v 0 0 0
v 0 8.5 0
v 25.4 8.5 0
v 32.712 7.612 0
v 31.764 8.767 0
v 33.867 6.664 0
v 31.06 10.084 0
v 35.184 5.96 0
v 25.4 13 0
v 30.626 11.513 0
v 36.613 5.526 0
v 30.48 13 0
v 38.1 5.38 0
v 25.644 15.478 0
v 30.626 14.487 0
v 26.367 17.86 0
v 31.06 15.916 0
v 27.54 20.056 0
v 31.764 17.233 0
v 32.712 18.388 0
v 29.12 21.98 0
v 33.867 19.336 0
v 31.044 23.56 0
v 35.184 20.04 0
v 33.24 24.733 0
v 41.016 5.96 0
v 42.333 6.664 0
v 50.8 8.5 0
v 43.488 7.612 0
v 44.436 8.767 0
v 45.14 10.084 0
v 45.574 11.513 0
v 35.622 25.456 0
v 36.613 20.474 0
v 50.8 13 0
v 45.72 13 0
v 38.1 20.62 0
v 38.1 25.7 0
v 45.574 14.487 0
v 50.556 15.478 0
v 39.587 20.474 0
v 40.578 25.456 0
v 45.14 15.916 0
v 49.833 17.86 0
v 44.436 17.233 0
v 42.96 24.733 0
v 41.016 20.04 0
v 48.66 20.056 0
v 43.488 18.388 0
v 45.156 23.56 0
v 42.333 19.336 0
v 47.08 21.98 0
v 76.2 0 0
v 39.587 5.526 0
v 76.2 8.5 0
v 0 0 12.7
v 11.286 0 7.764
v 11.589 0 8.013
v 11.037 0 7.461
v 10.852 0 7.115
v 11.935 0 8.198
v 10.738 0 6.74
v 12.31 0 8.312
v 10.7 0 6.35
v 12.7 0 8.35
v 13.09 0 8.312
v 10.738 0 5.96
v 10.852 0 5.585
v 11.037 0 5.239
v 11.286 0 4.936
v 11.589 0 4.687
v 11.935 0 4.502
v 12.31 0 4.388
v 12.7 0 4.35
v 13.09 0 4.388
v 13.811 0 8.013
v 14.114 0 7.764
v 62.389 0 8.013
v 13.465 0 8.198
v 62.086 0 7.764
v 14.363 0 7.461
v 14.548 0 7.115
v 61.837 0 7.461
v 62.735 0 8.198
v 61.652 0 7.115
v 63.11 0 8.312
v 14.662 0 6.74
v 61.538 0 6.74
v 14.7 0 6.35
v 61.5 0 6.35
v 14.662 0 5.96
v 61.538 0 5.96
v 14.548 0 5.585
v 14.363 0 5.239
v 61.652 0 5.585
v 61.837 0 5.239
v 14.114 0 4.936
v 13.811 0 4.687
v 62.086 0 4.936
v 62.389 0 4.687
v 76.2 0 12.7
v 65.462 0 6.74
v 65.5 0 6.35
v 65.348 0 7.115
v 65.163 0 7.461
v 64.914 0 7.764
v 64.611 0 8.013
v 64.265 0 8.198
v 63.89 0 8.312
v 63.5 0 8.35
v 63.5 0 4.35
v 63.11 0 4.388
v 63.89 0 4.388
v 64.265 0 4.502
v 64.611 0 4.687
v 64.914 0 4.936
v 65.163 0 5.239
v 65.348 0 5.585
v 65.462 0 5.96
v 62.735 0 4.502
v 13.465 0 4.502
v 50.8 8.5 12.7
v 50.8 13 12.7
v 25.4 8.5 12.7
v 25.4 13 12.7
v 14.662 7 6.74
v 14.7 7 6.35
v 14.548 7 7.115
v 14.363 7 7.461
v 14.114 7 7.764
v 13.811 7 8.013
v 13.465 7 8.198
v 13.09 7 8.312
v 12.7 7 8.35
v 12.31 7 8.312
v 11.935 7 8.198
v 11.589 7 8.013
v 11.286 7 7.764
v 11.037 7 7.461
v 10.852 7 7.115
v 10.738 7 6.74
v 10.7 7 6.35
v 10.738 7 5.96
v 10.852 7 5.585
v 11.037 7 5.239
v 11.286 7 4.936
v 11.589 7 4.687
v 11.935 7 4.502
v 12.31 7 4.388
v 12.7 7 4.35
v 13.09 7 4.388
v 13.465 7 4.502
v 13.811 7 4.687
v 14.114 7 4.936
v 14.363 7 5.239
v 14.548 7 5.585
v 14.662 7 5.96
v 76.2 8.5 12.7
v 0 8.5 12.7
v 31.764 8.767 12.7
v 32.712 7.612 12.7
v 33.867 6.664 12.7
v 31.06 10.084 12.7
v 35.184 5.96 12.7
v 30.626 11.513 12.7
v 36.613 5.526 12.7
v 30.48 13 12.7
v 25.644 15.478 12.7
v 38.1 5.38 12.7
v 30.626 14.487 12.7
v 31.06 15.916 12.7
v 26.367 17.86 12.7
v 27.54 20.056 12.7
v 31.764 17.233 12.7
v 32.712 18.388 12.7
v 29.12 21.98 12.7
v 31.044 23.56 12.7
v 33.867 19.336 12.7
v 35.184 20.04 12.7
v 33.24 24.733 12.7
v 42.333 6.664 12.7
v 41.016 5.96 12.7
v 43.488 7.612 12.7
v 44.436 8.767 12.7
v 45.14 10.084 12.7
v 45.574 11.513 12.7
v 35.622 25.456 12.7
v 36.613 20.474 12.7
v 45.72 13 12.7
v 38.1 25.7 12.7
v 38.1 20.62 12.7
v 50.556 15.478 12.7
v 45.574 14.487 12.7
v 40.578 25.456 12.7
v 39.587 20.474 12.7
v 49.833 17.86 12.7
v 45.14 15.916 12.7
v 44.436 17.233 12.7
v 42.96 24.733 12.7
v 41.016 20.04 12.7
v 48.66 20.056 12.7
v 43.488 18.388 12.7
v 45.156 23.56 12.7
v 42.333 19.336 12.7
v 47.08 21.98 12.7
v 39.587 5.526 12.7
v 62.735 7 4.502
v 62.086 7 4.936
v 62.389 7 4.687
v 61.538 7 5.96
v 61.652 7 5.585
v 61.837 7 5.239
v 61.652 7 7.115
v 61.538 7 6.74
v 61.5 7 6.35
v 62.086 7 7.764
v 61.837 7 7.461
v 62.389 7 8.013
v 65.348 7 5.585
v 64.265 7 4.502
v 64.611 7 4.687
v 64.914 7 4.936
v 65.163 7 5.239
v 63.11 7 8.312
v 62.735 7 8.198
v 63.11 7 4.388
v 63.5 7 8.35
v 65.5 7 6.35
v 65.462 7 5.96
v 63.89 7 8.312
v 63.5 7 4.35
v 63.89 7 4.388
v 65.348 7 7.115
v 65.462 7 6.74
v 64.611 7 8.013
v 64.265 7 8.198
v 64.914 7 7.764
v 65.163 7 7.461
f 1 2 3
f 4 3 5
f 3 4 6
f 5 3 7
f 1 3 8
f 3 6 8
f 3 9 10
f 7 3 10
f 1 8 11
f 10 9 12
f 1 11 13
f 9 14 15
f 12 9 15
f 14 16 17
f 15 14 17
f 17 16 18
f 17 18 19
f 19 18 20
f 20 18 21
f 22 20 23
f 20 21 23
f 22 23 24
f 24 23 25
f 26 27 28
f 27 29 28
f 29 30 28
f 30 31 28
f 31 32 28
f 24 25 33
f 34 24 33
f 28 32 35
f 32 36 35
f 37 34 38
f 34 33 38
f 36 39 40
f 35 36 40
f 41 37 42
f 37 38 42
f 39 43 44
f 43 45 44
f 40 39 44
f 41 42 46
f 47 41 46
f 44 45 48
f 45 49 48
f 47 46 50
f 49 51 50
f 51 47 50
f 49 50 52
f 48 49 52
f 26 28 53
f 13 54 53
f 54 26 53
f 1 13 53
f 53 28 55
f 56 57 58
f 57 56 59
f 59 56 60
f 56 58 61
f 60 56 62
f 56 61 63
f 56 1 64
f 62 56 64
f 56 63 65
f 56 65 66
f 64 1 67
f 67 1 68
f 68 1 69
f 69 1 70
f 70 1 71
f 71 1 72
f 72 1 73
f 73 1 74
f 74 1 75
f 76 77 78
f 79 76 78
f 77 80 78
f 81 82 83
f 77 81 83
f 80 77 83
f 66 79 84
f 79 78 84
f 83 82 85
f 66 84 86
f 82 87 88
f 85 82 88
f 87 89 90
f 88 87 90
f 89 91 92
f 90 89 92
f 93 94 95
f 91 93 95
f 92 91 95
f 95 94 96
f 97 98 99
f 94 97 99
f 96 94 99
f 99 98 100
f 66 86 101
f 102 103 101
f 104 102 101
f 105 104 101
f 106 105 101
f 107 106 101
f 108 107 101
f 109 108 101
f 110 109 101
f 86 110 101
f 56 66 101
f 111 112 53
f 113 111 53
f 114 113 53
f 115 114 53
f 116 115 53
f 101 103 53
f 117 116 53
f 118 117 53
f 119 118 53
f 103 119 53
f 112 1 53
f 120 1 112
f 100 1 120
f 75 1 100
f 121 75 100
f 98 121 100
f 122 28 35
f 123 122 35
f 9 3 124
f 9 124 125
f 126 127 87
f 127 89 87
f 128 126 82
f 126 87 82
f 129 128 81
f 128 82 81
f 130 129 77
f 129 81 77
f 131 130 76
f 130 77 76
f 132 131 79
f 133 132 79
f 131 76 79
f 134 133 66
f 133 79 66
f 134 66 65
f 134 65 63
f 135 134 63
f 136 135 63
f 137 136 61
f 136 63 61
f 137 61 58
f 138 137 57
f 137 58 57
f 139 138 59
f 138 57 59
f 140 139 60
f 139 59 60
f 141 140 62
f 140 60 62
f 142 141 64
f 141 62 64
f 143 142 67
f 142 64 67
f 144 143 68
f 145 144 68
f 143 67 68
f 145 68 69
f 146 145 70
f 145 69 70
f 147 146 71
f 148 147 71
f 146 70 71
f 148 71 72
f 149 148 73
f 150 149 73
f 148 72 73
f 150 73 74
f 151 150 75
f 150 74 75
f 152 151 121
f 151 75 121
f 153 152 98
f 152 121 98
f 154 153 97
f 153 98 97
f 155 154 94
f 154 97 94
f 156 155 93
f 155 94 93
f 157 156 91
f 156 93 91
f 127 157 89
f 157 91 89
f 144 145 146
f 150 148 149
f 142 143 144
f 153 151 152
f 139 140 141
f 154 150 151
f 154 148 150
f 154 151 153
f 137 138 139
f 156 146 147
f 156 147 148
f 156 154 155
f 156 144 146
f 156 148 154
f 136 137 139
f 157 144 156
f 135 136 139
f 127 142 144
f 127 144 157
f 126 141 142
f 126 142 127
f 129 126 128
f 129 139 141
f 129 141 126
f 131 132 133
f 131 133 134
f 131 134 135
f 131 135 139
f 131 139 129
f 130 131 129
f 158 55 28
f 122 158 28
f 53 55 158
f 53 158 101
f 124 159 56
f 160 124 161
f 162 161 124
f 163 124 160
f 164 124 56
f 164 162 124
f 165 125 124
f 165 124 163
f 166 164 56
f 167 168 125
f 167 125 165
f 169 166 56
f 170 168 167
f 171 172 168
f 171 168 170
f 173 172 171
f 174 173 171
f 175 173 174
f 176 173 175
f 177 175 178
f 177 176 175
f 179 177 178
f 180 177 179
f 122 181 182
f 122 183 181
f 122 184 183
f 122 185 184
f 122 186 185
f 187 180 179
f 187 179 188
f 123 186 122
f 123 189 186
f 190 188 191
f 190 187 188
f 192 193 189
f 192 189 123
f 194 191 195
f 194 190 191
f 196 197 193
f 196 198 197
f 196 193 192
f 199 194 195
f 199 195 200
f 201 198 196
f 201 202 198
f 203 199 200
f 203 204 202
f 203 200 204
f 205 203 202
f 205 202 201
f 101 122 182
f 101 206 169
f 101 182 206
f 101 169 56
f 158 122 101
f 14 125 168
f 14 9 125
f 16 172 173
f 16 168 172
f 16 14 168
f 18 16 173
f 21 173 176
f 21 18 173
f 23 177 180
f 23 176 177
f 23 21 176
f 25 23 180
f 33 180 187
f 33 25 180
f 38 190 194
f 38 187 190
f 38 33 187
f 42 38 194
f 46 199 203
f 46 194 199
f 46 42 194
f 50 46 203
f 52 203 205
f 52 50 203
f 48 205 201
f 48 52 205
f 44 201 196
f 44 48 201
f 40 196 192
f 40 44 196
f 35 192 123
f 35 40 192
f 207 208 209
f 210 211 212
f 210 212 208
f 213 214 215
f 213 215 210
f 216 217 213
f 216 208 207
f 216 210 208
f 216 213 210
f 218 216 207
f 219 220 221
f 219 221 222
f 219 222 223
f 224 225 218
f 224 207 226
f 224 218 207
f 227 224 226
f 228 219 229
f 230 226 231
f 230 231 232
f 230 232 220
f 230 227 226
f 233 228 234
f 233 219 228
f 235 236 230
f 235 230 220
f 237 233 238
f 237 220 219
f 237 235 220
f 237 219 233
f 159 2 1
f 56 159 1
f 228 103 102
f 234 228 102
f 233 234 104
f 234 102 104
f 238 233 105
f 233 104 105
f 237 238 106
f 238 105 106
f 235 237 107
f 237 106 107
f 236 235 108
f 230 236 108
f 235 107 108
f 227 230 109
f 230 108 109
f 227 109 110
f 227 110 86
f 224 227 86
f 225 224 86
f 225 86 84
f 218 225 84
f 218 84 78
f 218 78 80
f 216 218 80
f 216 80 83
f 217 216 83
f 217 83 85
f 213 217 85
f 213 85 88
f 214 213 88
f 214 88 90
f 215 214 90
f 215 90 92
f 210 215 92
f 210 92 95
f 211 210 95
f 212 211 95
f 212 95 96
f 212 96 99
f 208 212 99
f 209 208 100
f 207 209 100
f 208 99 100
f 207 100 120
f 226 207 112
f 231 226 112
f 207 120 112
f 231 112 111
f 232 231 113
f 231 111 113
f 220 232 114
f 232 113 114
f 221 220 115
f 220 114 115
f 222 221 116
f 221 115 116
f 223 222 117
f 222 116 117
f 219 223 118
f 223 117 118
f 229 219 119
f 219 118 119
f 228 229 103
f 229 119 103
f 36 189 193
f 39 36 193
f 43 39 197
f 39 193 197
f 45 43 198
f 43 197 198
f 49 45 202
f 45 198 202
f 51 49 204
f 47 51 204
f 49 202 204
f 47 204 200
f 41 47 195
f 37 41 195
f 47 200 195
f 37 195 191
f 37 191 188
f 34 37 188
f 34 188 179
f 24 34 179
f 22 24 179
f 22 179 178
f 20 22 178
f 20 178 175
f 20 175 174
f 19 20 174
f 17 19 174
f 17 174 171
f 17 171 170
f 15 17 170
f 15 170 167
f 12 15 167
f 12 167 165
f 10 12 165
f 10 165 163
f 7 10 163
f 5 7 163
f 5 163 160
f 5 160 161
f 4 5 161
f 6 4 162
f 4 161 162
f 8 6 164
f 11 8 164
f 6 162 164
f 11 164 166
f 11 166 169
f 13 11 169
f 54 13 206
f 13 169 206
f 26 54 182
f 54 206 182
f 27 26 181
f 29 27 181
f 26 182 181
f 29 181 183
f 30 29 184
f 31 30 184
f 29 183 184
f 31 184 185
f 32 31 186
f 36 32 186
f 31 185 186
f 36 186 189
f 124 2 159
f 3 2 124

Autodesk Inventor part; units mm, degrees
ref_plane "YZ Plane" through (0, 0, 0) normal (1, 0, 0) x (0, 1, 0)
ref_plane "XZ Plane" through (0, 0, 0) normal (0, 1, 0) x (-1, 0, 0)
ref_plane "XY Plane" through (0, 0, 0) normal (0, 0, 1) x (1, 0, 0)
sketch "Sketch1" plane through (0, 0, 0) normal (0, 0, 1) x (1, 0, 0)
  line L0 (0, 0) -> (76.2, 0)
  line L1 (50.8, 8.5) -> (50.8, 13)
  line L2 (25.4, 8.5) -> (25.4, 13)
  arc A0 (50.8, 13) -> (25.4, 13) centre (38.1, 13) ccw
  line L3 (0, 8.5) -> (25.4, 8.5)
  line L4 (76.2, 8.5) -> (50.8, 8.5)
  line L5 (76.2, 8.5) -> (76.2, 0)
  line L6 (0, 8.5) -> (0, 0)
  dimension "d0" = 76.2
  dimension "d4" = 25.4
  dimension "d18" = 13
  dimension "d20" = 25.4
  dimension "d21" = 8.5
  dimension "d22" = 8.5
  dimension "d23" = 12.7
  dimension "d24" = 25.4
  dimension "d25" = 12.7
extrude "BearingBlock" add sketch "Sketch1" along normal blind 12.7
sketch "Sketch2" plane through (0, 0, 12.7) normal (0, 0, 1) x (1, 0, 0)
  arc A0 (50.8, 13) -> (25.4, 13) centre (38.1, 13) ccw projected
  line L0 (0, 0) -> (76.2, 0) projected
  circle A1 centre (38.1, 13) radius 7.62
  point P0 (38.1, 25.7)
  dimension "d8" = 15.24
  dimension "d26" = 13
extrude "BearingMount" cut sketch "Sketch2" against normal through all
sketch "Sketch3" plane through (0, 0, 0) normal (0, -1, 0) x (1, 0, 0)
  line L0 (0, 0) -> (0, 12.7) projected
  line L1 (-76.2, 6.35) -> (76.2, 6.35) construction
  line L2 (76.2, 0) -> (76.2, 12.7) projected
  circle A0 centre (12.7, 6.35) radius 2
  circle A1 centre (63.5, 6.35) radius 2
  point P0 (0, 6.35)
  dimension "d11" = 12.7
  dimension "d12" = 12.7
  dimension "d13" = 4
  dimension "d14" = 4
  dimension "d15" = 50.8
extrude "HeatSetInsert" cut sketch "Sketch3" against normal blind 7
equation "\"d18\" = motor_centerline_height"
equation "\"d13\" = m3_heat_set_insert"
equation "\"d14\" = m3_heat_set_insert"
equation "\"m3_heat_set_insert\" = 4"
equation "\"m3_clearance\" = 3.4"
equation "\"m3_heat_set_depth\" = 7"
equation "\"robot_diameter\" = 354"
equation "\"hardboard_thickness\" = 5"
equation "\"motor_centerline_height\" = 13"
properties part number "wheel_bearing2"
